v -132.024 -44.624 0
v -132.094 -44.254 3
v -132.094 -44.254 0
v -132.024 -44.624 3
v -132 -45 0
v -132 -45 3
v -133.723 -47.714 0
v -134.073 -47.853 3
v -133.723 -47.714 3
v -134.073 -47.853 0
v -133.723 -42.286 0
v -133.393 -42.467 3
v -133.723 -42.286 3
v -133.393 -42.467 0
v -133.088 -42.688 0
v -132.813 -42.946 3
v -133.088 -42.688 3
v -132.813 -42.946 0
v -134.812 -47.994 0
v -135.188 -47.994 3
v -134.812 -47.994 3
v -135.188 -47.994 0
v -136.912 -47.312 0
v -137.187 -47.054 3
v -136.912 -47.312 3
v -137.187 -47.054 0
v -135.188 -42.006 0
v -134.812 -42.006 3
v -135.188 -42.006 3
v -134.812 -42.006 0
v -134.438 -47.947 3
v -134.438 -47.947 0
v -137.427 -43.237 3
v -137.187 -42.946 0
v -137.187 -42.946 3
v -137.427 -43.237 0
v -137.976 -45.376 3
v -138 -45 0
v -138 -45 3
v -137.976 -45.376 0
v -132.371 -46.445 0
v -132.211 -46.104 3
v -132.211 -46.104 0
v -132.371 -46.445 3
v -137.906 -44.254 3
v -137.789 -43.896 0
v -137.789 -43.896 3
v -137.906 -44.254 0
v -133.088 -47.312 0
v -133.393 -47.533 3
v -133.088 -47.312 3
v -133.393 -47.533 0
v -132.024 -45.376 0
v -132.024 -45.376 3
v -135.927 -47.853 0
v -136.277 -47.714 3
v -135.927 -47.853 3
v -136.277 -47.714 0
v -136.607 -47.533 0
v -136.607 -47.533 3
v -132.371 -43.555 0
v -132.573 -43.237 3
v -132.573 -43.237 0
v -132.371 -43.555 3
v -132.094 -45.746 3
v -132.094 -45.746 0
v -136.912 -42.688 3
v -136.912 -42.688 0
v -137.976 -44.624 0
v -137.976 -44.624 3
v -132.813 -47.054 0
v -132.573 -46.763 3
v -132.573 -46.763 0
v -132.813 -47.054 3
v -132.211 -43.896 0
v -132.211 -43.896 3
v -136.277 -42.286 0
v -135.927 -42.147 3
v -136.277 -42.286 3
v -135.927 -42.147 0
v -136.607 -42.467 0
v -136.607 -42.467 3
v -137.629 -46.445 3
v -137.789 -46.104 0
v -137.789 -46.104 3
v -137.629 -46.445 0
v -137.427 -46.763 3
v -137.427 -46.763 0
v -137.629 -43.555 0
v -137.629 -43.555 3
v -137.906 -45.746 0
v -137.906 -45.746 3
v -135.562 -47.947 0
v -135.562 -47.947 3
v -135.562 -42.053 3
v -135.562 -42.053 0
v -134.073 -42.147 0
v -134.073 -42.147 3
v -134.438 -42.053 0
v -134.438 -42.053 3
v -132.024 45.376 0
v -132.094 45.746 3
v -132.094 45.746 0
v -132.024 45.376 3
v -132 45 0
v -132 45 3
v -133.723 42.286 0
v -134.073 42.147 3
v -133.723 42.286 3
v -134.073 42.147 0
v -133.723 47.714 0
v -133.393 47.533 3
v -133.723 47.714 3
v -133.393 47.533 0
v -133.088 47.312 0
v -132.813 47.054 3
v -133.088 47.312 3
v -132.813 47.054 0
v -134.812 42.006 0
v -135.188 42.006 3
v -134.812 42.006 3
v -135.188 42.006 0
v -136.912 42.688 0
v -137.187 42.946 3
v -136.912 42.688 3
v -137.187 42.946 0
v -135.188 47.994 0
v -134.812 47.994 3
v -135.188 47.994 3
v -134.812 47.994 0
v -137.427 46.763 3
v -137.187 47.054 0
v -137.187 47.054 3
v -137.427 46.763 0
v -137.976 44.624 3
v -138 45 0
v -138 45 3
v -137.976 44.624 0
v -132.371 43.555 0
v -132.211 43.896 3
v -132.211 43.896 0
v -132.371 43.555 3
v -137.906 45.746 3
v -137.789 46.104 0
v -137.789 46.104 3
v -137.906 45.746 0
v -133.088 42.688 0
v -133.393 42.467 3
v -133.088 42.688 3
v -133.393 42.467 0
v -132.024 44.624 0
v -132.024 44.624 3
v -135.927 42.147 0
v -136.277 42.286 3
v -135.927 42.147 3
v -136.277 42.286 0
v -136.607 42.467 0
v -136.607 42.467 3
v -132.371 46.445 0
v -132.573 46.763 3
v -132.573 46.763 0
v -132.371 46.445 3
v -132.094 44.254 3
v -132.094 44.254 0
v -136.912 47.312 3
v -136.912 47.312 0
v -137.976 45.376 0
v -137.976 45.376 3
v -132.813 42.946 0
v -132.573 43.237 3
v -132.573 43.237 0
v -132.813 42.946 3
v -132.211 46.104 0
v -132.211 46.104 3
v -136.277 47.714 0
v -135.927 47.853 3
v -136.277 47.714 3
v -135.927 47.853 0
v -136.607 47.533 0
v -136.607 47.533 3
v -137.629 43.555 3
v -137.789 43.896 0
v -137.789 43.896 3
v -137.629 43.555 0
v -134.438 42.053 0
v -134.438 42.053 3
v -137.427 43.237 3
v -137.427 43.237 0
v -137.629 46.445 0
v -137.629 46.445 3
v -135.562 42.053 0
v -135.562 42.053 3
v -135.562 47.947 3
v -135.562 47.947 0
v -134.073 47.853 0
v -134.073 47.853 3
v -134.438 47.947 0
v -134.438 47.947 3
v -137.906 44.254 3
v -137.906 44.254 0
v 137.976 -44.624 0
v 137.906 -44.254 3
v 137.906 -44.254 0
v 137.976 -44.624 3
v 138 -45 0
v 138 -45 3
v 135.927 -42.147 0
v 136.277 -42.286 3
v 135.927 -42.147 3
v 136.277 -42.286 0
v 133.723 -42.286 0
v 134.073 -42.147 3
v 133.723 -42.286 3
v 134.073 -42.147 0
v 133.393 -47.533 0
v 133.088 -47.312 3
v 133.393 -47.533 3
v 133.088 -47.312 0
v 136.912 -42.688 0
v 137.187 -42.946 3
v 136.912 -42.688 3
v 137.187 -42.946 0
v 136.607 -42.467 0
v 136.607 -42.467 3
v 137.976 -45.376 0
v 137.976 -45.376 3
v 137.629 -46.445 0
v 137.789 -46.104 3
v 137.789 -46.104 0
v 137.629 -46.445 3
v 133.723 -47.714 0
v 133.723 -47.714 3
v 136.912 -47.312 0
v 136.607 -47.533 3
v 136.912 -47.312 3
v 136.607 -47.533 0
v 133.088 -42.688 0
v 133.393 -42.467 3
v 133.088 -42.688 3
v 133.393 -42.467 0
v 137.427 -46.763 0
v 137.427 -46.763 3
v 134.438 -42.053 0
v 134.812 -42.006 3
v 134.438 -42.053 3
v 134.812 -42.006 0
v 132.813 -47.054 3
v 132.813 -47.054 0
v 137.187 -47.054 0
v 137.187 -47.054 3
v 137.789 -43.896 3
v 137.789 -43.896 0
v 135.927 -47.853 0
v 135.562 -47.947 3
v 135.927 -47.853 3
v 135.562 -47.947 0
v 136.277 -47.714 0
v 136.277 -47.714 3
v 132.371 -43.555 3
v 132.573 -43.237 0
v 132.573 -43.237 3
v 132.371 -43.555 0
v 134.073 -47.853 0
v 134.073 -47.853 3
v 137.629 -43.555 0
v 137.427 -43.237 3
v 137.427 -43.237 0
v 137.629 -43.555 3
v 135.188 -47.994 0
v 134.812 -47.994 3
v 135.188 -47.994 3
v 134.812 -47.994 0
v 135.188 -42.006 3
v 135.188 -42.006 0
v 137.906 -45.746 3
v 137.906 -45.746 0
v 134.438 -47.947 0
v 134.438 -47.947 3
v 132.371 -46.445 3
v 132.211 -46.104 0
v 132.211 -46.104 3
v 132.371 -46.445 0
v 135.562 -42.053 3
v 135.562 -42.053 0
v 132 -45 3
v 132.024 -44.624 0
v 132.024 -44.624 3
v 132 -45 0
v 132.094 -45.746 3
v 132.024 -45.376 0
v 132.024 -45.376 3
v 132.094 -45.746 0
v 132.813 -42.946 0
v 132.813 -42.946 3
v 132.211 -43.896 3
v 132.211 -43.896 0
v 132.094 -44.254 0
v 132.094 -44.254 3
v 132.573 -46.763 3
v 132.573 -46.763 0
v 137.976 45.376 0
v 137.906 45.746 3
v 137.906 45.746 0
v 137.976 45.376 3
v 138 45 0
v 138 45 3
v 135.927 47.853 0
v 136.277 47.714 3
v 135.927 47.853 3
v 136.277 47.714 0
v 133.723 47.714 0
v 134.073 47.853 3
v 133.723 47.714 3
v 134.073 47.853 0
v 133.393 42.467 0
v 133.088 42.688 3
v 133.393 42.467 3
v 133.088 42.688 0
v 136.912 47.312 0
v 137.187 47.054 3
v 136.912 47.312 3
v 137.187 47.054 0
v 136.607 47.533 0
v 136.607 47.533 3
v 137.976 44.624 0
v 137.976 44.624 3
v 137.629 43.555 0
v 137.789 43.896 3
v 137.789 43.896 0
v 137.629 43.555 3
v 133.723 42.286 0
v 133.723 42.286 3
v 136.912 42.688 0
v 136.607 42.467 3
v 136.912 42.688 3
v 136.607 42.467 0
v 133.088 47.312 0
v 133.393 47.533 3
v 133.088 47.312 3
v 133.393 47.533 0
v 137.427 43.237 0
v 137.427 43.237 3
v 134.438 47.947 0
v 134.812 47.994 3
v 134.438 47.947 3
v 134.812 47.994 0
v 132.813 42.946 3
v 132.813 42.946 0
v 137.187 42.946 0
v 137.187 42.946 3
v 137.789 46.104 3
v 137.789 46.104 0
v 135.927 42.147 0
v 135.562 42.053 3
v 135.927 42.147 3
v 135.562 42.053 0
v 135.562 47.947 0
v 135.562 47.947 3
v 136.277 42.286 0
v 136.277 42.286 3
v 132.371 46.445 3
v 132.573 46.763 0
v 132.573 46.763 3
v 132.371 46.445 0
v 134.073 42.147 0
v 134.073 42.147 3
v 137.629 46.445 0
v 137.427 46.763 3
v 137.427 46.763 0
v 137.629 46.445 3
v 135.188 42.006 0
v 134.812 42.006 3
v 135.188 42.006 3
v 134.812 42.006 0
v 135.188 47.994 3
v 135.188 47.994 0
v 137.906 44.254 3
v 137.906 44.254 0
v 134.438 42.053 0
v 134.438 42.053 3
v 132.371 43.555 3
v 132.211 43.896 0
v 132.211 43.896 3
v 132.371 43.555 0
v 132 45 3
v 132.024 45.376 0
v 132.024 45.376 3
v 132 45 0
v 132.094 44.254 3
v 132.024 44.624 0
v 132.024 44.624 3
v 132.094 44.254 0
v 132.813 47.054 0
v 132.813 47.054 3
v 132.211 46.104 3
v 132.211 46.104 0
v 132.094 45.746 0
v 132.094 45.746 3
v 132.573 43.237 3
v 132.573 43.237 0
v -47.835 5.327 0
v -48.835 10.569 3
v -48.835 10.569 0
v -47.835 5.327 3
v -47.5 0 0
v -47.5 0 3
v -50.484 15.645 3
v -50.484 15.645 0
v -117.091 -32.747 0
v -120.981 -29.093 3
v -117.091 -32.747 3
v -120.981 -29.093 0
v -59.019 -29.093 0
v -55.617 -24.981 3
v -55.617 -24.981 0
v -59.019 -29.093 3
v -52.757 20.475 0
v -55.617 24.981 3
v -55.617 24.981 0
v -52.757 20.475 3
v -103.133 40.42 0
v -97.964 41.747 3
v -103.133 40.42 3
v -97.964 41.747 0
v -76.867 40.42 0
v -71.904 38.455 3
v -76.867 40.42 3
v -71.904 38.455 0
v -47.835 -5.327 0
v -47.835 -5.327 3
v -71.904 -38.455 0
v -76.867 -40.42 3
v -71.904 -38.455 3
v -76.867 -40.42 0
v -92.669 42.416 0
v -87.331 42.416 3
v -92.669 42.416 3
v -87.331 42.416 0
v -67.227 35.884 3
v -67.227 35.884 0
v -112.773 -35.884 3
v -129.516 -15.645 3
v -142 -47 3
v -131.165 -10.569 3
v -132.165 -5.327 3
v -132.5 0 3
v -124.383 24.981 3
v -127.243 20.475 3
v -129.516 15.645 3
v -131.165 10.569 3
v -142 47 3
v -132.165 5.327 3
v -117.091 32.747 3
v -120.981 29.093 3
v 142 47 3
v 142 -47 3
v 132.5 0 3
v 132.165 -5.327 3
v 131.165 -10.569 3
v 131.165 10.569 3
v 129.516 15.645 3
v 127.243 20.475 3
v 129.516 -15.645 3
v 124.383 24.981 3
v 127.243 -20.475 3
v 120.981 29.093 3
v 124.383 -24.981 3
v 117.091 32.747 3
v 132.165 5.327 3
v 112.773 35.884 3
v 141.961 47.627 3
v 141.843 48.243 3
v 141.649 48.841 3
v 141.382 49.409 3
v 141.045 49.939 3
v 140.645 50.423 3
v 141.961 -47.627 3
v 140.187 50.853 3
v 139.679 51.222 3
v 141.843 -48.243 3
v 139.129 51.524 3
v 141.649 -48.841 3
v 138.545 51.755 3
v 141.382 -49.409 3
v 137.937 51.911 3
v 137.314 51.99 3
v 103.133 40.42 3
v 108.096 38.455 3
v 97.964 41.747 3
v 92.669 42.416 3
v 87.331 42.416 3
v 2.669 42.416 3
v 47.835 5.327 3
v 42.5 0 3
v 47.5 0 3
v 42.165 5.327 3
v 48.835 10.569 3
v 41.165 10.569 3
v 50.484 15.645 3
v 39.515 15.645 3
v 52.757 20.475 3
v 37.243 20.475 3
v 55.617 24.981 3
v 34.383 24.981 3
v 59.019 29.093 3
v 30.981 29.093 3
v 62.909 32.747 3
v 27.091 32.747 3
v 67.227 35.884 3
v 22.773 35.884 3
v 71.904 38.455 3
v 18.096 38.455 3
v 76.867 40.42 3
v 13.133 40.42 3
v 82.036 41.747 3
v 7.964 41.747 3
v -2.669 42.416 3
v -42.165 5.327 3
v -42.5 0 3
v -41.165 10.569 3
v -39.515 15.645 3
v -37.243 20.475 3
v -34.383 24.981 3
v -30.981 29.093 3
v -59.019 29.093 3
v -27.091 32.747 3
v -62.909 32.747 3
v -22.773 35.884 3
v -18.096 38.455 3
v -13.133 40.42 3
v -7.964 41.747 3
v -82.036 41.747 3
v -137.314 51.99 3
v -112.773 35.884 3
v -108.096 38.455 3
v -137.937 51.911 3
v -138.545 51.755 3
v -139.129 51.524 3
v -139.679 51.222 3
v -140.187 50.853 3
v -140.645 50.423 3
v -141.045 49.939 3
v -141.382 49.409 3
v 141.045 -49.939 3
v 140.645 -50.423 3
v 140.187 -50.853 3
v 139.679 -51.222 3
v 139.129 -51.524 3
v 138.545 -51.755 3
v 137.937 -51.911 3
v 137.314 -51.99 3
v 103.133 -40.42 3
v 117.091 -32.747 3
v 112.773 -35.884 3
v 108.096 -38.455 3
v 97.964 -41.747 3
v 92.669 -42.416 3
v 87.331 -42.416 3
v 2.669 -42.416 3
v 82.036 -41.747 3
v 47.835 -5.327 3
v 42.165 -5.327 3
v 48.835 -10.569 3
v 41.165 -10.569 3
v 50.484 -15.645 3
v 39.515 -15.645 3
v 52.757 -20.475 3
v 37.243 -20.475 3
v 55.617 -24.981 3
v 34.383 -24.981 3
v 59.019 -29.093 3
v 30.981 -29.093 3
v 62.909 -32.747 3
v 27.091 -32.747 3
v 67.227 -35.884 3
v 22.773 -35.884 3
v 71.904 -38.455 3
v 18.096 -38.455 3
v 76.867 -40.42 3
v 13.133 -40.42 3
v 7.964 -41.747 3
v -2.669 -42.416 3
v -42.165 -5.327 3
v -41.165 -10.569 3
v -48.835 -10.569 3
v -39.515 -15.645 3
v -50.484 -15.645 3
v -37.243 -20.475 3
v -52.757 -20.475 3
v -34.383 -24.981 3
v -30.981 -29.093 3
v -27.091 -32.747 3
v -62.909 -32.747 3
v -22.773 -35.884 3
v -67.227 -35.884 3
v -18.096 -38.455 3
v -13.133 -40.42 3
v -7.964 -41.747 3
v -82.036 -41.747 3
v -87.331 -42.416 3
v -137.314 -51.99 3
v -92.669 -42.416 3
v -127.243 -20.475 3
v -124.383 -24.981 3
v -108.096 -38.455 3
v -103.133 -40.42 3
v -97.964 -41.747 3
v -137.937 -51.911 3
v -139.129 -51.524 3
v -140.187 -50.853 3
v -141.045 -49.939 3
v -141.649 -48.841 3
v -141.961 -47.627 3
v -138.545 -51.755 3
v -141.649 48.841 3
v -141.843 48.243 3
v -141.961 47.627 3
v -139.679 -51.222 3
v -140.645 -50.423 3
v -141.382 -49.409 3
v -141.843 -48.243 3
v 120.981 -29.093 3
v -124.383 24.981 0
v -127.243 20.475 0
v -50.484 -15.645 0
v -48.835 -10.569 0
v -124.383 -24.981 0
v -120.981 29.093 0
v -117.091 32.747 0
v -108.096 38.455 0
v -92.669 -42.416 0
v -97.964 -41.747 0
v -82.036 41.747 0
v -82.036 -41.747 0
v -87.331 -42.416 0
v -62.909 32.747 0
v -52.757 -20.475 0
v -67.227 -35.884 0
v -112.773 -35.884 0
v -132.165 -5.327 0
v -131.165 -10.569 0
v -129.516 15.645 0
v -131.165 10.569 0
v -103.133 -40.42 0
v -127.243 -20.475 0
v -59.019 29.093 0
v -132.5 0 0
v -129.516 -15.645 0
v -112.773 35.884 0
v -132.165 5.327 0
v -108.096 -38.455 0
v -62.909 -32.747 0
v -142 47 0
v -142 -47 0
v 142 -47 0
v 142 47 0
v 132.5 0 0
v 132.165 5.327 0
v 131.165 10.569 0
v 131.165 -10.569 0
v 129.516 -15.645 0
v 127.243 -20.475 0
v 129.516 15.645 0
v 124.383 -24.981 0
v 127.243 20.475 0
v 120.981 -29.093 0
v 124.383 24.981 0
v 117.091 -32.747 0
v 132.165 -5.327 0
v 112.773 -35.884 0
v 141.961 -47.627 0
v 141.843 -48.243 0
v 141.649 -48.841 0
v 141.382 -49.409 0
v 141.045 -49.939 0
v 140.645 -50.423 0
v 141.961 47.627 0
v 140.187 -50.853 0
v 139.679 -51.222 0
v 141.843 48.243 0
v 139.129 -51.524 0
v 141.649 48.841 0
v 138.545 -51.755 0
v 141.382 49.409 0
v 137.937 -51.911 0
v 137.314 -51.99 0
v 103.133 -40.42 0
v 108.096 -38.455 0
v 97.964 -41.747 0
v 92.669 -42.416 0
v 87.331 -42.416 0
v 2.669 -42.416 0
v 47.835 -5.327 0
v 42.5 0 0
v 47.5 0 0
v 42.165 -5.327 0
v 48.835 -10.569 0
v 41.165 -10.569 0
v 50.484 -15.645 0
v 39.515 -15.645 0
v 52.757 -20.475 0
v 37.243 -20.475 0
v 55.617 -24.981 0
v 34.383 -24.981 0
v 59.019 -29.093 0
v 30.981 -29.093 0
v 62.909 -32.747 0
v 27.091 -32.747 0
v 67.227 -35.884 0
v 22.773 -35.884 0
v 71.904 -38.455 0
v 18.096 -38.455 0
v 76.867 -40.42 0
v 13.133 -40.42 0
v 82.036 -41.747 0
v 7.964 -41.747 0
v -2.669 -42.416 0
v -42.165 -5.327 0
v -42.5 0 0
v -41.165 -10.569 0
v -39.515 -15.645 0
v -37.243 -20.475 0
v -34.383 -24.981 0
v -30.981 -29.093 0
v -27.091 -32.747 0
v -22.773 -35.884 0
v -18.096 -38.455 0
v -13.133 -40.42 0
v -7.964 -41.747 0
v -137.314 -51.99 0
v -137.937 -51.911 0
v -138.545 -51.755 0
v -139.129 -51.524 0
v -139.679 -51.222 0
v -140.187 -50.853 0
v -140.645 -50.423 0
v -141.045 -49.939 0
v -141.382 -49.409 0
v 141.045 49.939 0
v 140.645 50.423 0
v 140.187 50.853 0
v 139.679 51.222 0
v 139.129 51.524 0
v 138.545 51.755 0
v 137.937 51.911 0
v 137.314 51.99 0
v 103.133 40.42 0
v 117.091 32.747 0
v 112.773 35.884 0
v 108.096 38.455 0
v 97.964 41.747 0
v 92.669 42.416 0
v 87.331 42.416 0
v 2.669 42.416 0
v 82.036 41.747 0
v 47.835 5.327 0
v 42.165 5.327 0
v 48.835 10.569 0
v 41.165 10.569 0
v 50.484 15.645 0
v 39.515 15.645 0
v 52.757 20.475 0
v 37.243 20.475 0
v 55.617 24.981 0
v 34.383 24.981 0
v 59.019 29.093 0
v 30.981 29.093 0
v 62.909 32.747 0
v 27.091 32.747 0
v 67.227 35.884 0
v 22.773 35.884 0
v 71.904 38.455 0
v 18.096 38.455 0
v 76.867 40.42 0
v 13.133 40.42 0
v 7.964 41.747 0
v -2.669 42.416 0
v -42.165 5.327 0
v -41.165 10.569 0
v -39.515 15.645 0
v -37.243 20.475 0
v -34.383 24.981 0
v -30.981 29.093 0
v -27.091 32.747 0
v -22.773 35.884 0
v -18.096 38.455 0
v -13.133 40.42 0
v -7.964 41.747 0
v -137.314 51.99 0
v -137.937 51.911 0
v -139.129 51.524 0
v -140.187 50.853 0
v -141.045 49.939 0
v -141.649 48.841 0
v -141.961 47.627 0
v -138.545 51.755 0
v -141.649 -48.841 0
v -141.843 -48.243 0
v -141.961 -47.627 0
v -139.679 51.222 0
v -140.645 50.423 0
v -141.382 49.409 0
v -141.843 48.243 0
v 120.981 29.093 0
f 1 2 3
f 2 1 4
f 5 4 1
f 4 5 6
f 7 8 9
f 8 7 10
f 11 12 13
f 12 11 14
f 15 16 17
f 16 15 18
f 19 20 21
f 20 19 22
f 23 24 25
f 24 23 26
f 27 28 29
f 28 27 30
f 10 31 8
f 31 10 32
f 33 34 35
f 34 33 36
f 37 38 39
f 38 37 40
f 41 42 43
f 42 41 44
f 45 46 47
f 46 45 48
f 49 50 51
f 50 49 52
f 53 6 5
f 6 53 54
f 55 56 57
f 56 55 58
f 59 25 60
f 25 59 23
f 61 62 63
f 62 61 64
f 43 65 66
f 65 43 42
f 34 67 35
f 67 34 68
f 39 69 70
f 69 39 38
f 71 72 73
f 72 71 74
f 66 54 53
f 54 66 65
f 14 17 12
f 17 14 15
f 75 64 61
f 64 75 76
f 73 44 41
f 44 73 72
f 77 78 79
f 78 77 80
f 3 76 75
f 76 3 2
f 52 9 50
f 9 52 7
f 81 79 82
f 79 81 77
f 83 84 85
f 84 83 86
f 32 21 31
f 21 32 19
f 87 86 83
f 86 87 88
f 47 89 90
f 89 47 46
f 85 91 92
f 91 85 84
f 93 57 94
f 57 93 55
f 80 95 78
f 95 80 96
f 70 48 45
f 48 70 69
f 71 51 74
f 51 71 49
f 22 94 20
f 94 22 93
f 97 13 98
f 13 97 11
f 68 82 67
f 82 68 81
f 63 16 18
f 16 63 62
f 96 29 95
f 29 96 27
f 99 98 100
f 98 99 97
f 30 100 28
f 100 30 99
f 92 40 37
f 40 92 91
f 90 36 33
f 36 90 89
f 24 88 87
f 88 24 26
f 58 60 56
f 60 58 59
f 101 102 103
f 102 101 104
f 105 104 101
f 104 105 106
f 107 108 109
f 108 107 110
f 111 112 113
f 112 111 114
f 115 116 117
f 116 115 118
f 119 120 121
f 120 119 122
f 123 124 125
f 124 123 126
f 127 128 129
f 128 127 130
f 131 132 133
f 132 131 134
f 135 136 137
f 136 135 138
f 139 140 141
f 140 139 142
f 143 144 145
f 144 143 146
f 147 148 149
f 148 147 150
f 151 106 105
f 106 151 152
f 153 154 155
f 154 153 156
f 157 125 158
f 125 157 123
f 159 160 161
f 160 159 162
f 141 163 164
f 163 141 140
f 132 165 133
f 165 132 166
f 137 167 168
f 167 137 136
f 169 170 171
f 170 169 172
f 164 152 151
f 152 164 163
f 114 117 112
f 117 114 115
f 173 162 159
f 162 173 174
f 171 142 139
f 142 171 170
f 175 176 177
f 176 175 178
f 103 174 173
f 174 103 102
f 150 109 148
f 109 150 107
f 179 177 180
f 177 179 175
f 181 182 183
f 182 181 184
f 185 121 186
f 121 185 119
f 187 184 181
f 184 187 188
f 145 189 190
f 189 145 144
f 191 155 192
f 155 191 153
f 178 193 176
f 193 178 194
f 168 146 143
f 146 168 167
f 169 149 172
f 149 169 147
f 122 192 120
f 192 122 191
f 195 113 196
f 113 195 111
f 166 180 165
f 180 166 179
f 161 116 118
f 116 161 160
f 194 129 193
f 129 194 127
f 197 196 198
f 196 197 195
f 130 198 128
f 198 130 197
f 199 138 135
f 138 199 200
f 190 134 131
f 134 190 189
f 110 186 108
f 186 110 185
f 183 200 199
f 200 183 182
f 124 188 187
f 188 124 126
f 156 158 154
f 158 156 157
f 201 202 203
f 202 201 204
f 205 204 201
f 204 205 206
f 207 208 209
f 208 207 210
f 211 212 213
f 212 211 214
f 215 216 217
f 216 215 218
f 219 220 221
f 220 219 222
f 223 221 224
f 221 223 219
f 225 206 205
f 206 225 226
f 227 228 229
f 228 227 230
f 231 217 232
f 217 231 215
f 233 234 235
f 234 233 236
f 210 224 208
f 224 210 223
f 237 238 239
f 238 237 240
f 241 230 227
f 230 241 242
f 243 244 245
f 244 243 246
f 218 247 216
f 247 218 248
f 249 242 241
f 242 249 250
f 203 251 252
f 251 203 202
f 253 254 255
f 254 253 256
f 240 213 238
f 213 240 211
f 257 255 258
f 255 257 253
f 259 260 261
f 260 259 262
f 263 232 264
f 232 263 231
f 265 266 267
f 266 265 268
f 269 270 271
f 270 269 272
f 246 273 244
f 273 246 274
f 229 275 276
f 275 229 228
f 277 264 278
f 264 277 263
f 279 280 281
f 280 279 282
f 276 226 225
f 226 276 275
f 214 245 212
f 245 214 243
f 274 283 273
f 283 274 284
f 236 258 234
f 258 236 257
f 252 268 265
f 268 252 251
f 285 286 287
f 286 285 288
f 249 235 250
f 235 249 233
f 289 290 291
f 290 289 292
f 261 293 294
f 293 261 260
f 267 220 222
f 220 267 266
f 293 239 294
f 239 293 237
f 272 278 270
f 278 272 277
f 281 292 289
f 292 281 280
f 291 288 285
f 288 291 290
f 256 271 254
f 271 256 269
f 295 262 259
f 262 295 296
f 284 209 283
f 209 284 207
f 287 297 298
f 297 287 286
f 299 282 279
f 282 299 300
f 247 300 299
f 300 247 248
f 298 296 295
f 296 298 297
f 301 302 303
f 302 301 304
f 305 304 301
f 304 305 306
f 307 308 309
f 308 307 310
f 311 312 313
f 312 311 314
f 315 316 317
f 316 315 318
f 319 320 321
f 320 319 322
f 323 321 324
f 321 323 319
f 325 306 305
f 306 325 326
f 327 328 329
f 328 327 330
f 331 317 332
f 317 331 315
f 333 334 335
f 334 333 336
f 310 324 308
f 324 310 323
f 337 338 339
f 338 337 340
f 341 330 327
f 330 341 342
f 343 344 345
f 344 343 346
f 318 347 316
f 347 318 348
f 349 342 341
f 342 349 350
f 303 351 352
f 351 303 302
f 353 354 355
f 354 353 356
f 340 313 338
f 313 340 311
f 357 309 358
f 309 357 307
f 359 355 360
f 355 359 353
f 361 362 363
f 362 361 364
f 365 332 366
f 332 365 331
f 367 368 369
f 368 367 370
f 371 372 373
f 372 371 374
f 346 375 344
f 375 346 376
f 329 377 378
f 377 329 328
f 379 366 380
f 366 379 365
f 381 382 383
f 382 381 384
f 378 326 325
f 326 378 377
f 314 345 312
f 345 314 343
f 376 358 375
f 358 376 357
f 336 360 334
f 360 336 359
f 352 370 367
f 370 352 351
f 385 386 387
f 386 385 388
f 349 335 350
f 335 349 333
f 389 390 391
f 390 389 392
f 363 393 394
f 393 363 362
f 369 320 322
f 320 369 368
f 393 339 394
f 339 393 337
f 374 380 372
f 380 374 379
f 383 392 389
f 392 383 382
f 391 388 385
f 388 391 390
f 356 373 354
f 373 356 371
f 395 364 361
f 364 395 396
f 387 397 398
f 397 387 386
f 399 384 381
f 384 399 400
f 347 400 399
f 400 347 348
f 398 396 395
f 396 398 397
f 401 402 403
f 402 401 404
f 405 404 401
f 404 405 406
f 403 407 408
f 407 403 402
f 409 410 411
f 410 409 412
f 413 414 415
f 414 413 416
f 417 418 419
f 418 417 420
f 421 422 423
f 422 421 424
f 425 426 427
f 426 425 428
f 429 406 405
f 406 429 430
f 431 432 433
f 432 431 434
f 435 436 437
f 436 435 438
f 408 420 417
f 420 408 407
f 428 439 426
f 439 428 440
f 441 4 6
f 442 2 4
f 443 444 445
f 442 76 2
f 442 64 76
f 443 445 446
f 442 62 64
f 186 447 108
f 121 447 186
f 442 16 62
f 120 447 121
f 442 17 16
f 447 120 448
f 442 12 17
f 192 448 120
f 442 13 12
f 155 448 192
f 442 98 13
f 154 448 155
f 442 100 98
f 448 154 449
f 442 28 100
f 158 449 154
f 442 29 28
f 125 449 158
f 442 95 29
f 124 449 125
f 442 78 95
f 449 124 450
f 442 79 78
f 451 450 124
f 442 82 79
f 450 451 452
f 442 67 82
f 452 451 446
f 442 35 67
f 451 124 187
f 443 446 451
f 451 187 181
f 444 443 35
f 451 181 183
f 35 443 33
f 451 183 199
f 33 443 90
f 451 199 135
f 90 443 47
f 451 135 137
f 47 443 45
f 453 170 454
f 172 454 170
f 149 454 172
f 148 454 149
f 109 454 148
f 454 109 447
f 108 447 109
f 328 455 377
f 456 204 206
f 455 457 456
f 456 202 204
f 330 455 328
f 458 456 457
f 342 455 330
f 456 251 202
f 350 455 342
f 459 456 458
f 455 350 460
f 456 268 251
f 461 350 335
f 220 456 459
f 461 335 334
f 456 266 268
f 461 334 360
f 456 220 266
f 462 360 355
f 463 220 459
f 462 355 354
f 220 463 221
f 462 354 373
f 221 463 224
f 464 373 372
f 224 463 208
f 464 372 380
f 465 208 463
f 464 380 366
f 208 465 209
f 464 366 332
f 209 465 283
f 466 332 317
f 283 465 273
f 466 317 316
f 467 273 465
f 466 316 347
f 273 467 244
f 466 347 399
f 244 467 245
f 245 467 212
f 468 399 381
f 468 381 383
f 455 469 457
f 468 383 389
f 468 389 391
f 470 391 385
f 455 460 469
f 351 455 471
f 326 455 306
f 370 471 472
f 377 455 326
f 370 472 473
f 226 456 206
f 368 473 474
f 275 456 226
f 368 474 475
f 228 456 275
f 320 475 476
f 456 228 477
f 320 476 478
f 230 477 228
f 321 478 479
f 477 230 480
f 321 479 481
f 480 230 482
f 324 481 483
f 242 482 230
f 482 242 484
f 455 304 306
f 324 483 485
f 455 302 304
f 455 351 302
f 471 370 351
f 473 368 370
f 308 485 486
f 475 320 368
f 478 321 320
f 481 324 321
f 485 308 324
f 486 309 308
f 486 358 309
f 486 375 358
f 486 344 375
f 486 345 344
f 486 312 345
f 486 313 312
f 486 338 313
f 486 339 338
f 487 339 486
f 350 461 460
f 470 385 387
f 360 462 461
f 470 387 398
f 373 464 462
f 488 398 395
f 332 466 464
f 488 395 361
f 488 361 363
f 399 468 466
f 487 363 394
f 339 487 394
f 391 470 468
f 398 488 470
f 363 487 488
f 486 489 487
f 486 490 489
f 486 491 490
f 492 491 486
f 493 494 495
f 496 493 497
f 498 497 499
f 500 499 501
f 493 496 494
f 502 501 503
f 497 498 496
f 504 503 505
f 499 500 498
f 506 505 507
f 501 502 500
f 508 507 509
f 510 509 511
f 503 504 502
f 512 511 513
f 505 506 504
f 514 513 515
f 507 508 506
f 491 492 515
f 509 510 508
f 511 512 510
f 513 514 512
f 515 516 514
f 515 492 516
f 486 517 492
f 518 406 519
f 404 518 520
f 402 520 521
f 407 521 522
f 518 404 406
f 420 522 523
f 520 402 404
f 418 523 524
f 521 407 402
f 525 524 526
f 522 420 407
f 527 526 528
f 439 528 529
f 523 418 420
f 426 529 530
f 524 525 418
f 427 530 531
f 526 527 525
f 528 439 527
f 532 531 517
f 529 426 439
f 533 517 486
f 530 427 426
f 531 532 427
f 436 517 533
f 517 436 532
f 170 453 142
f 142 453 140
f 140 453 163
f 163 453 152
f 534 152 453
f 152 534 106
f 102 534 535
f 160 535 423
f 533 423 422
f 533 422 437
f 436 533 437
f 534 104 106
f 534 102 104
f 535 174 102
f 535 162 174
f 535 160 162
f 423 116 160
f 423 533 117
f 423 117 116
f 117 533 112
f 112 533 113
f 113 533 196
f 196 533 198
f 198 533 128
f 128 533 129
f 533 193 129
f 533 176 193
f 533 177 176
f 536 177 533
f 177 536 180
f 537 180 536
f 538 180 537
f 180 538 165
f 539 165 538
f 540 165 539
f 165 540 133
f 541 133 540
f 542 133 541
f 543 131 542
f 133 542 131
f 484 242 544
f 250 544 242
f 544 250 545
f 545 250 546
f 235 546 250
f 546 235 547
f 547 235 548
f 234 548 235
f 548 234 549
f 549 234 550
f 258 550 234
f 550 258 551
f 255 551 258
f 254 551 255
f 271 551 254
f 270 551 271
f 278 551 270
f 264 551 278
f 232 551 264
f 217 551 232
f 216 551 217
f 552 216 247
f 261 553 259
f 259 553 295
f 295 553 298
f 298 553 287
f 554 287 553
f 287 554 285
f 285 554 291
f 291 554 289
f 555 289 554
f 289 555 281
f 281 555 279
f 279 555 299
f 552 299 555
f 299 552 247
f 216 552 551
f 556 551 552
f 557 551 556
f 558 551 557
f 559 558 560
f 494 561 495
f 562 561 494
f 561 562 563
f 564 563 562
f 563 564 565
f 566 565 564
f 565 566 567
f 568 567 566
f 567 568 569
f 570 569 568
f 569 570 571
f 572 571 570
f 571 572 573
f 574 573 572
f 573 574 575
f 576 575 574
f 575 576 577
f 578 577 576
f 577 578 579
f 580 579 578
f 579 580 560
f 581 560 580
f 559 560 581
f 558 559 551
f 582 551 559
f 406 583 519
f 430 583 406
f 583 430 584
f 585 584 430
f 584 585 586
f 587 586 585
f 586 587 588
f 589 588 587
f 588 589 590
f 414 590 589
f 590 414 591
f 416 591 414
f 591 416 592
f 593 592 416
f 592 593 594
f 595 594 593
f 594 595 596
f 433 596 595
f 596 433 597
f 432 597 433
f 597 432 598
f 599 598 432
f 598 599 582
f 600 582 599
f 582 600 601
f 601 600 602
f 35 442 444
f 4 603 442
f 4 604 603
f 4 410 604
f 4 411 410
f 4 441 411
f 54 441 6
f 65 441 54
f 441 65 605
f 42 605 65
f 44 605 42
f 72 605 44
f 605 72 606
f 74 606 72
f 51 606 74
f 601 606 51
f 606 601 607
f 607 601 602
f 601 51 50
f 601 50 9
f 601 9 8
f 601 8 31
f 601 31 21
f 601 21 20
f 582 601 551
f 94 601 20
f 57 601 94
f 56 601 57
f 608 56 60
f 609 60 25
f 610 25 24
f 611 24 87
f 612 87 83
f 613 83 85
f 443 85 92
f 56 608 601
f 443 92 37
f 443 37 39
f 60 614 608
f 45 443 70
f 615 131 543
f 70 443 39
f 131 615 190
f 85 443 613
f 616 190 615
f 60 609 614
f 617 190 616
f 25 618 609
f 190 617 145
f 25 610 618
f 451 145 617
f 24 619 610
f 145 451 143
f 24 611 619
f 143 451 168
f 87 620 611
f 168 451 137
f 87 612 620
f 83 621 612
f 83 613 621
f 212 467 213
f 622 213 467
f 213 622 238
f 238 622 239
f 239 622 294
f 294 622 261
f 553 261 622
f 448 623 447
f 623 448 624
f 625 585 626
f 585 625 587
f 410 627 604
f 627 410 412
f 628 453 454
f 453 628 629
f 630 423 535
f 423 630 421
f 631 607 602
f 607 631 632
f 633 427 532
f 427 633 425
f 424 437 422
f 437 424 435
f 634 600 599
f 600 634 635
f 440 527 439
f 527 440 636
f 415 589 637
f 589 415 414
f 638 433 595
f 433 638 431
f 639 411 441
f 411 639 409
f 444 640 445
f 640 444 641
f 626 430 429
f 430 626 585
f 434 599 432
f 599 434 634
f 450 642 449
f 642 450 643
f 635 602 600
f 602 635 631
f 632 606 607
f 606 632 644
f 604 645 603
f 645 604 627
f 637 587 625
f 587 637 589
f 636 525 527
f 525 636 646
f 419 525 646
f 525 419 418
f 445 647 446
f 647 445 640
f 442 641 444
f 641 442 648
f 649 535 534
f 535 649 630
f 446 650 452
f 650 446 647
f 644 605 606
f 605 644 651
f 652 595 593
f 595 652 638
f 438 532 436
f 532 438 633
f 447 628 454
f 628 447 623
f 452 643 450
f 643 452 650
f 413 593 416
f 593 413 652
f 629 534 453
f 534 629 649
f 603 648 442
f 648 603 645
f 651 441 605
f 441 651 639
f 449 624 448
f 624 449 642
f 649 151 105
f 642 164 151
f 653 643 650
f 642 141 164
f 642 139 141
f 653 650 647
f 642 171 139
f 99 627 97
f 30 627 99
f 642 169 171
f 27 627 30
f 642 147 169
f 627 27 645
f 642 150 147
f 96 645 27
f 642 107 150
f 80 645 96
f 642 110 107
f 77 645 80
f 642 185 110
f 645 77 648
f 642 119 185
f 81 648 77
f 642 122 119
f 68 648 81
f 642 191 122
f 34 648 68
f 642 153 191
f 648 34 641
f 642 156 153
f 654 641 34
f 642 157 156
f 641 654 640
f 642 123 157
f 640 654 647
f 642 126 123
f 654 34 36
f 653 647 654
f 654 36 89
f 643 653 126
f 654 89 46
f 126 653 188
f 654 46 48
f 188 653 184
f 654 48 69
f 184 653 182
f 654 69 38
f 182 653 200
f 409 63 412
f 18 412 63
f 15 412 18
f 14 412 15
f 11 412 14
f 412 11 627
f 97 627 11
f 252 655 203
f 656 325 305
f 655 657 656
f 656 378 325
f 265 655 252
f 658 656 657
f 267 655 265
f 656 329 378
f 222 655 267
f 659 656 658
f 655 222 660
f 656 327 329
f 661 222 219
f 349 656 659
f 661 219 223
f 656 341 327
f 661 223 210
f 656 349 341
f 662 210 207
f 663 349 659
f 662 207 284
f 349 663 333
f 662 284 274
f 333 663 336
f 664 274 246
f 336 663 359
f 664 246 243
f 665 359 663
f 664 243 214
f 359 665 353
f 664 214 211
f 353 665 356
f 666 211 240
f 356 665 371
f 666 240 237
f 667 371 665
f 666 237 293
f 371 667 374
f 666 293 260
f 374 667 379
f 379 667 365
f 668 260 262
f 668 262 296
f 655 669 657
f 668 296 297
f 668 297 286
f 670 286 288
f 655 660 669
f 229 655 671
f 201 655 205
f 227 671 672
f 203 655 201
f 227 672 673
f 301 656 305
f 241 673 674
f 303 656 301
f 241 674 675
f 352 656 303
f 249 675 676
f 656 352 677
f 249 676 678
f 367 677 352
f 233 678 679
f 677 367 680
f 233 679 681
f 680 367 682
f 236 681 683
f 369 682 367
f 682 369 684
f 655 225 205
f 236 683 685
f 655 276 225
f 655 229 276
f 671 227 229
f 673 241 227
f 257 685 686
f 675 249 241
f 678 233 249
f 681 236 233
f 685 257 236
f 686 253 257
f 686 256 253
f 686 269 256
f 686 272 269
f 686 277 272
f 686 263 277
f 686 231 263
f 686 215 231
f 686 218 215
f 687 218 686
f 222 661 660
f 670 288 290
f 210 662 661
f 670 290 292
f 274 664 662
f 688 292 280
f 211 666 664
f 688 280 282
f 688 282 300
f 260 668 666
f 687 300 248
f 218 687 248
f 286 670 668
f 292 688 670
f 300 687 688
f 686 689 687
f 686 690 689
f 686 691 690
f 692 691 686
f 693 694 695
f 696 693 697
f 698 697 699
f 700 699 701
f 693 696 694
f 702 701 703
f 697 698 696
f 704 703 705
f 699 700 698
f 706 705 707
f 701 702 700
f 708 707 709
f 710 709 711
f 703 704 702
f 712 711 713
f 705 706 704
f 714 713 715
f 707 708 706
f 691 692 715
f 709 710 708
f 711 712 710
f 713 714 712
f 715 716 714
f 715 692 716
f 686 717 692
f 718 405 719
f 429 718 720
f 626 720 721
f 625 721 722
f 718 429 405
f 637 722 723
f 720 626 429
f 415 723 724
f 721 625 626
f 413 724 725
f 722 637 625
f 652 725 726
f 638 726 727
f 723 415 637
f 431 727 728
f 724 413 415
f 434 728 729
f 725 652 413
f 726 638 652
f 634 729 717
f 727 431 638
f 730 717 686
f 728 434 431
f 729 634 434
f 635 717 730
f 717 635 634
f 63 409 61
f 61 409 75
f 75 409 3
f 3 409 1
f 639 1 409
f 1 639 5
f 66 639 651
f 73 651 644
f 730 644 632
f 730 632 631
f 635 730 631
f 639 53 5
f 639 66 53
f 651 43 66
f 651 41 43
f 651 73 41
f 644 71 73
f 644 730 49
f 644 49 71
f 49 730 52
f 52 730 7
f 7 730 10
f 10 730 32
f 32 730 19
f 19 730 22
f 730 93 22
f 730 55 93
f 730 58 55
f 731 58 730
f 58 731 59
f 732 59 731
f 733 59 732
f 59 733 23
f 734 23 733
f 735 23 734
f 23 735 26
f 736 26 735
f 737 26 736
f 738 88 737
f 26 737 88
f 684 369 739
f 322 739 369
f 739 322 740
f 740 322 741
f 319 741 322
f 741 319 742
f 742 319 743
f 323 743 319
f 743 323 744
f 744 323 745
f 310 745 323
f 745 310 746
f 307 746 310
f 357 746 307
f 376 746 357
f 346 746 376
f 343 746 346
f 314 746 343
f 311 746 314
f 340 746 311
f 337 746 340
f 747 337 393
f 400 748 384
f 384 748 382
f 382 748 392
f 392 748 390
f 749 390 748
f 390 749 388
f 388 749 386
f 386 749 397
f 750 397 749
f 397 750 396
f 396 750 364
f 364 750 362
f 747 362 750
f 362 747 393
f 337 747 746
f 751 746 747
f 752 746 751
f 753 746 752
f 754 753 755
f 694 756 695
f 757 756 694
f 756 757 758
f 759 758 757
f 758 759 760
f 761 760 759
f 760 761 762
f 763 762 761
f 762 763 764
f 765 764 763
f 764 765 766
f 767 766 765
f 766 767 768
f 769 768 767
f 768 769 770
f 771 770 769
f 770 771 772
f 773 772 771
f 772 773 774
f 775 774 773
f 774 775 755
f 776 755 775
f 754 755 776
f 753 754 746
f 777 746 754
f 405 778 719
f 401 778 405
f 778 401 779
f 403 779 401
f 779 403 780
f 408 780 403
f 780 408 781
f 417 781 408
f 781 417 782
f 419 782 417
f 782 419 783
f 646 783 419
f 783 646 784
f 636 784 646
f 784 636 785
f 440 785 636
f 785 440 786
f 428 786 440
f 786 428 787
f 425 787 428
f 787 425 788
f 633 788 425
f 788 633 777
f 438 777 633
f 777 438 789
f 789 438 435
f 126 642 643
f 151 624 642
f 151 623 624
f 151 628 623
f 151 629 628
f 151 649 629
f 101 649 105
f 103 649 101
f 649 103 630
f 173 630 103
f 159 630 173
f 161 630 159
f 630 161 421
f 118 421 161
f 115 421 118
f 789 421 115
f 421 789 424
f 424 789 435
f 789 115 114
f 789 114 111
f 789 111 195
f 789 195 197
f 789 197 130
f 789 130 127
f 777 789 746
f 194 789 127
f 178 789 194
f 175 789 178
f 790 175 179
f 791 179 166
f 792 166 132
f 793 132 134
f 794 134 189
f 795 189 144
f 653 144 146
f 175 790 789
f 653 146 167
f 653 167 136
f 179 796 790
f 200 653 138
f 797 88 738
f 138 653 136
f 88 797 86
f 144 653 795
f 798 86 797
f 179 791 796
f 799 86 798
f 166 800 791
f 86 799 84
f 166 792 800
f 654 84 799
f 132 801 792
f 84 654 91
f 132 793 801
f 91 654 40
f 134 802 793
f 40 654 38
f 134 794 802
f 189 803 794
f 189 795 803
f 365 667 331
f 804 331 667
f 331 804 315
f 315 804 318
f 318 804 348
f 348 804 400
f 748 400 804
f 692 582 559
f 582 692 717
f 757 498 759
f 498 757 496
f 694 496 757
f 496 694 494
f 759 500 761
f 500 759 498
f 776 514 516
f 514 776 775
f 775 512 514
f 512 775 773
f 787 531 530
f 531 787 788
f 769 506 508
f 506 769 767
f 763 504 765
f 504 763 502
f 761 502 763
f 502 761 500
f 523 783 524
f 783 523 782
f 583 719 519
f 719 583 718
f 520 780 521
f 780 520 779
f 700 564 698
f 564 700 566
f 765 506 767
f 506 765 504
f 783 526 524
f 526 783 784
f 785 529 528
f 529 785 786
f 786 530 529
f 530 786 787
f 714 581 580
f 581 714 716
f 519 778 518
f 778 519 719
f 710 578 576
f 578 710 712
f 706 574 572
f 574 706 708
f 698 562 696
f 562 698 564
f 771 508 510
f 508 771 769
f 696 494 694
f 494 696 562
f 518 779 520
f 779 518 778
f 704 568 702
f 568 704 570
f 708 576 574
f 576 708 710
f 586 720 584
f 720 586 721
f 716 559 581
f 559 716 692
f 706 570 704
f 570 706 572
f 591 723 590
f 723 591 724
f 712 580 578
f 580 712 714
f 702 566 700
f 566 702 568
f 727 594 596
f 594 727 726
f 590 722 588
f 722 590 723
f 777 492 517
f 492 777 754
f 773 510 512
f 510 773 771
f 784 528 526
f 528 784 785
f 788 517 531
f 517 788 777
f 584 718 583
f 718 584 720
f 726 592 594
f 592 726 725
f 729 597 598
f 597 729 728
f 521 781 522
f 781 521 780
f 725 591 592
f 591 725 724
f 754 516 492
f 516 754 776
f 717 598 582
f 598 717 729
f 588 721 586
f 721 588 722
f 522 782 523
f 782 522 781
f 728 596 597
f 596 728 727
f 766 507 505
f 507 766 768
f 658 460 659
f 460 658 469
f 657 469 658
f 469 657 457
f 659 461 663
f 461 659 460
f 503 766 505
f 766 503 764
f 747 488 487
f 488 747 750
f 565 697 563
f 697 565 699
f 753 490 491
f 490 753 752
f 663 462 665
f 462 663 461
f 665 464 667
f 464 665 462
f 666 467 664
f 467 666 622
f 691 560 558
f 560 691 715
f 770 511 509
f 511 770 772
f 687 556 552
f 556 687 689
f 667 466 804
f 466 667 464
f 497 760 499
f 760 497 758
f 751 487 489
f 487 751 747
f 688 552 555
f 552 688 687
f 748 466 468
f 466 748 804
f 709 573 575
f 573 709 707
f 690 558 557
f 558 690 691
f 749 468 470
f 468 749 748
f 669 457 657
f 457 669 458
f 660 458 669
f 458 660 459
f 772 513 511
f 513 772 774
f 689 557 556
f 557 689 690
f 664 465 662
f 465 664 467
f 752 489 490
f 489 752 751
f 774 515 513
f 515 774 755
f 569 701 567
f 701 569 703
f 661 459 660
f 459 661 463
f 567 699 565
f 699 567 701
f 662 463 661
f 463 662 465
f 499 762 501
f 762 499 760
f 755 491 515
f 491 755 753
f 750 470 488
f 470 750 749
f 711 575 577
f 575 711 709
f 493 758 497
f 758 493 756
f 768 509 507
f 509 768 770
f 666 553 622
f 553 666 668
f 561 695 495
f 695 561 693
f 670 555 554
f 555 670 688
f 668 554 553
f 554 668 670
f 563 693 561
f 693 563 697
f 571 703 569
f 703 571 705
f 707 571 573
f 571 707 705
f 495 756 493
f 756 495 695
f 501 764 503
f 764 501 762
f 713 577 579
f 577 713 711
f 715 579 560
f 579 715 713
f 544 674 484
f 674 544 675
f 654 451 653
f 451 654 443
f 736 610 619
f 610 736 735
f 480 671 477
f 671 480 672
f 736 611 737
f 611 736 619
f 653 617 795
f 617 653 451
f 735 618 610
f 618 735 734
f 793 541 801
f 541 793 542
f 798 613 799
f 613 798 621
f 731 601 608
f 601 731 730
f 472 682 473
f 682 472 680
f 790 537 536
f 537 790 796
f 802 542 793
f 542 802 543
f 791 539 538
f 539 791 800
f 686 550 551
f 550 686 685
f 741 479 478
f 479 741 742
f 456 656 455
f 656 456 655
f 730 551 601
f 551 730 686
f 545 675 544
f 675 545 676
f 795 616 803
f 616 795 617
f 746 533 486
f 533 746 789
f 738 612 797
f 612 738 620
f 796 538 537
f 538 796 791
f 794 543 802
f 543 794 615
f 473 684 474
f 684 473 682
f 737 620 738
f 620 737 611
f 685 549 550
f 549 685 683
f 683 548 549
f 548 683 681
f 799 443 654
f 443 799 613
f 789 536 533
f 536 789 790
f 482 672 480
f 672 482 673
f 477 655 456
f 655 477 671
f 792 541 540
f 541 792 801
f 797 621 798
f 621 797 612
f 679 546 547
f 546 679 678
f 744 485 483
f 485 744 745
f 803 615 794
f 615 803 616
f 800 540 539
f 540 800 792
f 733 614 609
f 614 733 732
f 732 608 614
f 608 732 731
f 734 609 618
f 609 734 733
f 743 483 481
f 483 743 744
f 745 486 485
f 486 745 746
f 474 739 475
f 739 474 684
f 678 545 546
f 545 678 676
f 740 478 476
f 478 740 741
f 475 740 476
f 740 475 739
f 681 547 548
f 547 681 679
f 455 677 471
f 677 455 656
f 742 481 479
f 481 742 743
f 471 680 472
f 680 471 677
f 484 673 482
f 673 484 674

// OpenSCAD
$fn = 50;


difference() {
	union() {
		hull() {
			translate(v = [-137.0000000000, 47.0000000000, 0]) {
				cylinder(h = 3, r = 5);
			}
			translate(v = [137.0000000000, 47.0000000000, 0]) {
				cylinder(h = 3, r = 5);
			}
			translate(v = [-137.0000000000, -47.0000000000, 0]) {
				cylinder(h = 3, r = 5);
			}
			translate(v = [137.0000000000, -47.0000000000, 0]) {
				cylinder(h = 3, r = 5);
			}
		}
	}
	union() {
		#translate(v = [-135.0000000000, -45.0000000000, -100.0000000000]) {
			cylinder(h = 200, r = 3.0000000000);
		}
		#translate(v = [-135.0000000000, 45.0000000000, -100.0000000000]) {
			cylinder(h = 200, r = 3.0000000000);
		}
		#translate(v = [135.0000000000, -45.0000000000, -100.0000000000]) {
			cylinder(h = 200, r = 3.0000000000);
		}
		#translate(v = [135.0000000000, 45.0000000000, -100.0000000000]) {
			cylinder(h = 200, r = 3.0000000000);
		}
		#translate(v = [-90.0000000000, 0, 0]) {
			cylinder(h = 3, r = 42.5000000000);
		}
		#cylinder(h = 3, r = 42.5000000000);
		#translate(v = [90.0000000000, 0, 0]) {
			cylinder(h = 3, r = 42.5000000000);
		}
	}
}
